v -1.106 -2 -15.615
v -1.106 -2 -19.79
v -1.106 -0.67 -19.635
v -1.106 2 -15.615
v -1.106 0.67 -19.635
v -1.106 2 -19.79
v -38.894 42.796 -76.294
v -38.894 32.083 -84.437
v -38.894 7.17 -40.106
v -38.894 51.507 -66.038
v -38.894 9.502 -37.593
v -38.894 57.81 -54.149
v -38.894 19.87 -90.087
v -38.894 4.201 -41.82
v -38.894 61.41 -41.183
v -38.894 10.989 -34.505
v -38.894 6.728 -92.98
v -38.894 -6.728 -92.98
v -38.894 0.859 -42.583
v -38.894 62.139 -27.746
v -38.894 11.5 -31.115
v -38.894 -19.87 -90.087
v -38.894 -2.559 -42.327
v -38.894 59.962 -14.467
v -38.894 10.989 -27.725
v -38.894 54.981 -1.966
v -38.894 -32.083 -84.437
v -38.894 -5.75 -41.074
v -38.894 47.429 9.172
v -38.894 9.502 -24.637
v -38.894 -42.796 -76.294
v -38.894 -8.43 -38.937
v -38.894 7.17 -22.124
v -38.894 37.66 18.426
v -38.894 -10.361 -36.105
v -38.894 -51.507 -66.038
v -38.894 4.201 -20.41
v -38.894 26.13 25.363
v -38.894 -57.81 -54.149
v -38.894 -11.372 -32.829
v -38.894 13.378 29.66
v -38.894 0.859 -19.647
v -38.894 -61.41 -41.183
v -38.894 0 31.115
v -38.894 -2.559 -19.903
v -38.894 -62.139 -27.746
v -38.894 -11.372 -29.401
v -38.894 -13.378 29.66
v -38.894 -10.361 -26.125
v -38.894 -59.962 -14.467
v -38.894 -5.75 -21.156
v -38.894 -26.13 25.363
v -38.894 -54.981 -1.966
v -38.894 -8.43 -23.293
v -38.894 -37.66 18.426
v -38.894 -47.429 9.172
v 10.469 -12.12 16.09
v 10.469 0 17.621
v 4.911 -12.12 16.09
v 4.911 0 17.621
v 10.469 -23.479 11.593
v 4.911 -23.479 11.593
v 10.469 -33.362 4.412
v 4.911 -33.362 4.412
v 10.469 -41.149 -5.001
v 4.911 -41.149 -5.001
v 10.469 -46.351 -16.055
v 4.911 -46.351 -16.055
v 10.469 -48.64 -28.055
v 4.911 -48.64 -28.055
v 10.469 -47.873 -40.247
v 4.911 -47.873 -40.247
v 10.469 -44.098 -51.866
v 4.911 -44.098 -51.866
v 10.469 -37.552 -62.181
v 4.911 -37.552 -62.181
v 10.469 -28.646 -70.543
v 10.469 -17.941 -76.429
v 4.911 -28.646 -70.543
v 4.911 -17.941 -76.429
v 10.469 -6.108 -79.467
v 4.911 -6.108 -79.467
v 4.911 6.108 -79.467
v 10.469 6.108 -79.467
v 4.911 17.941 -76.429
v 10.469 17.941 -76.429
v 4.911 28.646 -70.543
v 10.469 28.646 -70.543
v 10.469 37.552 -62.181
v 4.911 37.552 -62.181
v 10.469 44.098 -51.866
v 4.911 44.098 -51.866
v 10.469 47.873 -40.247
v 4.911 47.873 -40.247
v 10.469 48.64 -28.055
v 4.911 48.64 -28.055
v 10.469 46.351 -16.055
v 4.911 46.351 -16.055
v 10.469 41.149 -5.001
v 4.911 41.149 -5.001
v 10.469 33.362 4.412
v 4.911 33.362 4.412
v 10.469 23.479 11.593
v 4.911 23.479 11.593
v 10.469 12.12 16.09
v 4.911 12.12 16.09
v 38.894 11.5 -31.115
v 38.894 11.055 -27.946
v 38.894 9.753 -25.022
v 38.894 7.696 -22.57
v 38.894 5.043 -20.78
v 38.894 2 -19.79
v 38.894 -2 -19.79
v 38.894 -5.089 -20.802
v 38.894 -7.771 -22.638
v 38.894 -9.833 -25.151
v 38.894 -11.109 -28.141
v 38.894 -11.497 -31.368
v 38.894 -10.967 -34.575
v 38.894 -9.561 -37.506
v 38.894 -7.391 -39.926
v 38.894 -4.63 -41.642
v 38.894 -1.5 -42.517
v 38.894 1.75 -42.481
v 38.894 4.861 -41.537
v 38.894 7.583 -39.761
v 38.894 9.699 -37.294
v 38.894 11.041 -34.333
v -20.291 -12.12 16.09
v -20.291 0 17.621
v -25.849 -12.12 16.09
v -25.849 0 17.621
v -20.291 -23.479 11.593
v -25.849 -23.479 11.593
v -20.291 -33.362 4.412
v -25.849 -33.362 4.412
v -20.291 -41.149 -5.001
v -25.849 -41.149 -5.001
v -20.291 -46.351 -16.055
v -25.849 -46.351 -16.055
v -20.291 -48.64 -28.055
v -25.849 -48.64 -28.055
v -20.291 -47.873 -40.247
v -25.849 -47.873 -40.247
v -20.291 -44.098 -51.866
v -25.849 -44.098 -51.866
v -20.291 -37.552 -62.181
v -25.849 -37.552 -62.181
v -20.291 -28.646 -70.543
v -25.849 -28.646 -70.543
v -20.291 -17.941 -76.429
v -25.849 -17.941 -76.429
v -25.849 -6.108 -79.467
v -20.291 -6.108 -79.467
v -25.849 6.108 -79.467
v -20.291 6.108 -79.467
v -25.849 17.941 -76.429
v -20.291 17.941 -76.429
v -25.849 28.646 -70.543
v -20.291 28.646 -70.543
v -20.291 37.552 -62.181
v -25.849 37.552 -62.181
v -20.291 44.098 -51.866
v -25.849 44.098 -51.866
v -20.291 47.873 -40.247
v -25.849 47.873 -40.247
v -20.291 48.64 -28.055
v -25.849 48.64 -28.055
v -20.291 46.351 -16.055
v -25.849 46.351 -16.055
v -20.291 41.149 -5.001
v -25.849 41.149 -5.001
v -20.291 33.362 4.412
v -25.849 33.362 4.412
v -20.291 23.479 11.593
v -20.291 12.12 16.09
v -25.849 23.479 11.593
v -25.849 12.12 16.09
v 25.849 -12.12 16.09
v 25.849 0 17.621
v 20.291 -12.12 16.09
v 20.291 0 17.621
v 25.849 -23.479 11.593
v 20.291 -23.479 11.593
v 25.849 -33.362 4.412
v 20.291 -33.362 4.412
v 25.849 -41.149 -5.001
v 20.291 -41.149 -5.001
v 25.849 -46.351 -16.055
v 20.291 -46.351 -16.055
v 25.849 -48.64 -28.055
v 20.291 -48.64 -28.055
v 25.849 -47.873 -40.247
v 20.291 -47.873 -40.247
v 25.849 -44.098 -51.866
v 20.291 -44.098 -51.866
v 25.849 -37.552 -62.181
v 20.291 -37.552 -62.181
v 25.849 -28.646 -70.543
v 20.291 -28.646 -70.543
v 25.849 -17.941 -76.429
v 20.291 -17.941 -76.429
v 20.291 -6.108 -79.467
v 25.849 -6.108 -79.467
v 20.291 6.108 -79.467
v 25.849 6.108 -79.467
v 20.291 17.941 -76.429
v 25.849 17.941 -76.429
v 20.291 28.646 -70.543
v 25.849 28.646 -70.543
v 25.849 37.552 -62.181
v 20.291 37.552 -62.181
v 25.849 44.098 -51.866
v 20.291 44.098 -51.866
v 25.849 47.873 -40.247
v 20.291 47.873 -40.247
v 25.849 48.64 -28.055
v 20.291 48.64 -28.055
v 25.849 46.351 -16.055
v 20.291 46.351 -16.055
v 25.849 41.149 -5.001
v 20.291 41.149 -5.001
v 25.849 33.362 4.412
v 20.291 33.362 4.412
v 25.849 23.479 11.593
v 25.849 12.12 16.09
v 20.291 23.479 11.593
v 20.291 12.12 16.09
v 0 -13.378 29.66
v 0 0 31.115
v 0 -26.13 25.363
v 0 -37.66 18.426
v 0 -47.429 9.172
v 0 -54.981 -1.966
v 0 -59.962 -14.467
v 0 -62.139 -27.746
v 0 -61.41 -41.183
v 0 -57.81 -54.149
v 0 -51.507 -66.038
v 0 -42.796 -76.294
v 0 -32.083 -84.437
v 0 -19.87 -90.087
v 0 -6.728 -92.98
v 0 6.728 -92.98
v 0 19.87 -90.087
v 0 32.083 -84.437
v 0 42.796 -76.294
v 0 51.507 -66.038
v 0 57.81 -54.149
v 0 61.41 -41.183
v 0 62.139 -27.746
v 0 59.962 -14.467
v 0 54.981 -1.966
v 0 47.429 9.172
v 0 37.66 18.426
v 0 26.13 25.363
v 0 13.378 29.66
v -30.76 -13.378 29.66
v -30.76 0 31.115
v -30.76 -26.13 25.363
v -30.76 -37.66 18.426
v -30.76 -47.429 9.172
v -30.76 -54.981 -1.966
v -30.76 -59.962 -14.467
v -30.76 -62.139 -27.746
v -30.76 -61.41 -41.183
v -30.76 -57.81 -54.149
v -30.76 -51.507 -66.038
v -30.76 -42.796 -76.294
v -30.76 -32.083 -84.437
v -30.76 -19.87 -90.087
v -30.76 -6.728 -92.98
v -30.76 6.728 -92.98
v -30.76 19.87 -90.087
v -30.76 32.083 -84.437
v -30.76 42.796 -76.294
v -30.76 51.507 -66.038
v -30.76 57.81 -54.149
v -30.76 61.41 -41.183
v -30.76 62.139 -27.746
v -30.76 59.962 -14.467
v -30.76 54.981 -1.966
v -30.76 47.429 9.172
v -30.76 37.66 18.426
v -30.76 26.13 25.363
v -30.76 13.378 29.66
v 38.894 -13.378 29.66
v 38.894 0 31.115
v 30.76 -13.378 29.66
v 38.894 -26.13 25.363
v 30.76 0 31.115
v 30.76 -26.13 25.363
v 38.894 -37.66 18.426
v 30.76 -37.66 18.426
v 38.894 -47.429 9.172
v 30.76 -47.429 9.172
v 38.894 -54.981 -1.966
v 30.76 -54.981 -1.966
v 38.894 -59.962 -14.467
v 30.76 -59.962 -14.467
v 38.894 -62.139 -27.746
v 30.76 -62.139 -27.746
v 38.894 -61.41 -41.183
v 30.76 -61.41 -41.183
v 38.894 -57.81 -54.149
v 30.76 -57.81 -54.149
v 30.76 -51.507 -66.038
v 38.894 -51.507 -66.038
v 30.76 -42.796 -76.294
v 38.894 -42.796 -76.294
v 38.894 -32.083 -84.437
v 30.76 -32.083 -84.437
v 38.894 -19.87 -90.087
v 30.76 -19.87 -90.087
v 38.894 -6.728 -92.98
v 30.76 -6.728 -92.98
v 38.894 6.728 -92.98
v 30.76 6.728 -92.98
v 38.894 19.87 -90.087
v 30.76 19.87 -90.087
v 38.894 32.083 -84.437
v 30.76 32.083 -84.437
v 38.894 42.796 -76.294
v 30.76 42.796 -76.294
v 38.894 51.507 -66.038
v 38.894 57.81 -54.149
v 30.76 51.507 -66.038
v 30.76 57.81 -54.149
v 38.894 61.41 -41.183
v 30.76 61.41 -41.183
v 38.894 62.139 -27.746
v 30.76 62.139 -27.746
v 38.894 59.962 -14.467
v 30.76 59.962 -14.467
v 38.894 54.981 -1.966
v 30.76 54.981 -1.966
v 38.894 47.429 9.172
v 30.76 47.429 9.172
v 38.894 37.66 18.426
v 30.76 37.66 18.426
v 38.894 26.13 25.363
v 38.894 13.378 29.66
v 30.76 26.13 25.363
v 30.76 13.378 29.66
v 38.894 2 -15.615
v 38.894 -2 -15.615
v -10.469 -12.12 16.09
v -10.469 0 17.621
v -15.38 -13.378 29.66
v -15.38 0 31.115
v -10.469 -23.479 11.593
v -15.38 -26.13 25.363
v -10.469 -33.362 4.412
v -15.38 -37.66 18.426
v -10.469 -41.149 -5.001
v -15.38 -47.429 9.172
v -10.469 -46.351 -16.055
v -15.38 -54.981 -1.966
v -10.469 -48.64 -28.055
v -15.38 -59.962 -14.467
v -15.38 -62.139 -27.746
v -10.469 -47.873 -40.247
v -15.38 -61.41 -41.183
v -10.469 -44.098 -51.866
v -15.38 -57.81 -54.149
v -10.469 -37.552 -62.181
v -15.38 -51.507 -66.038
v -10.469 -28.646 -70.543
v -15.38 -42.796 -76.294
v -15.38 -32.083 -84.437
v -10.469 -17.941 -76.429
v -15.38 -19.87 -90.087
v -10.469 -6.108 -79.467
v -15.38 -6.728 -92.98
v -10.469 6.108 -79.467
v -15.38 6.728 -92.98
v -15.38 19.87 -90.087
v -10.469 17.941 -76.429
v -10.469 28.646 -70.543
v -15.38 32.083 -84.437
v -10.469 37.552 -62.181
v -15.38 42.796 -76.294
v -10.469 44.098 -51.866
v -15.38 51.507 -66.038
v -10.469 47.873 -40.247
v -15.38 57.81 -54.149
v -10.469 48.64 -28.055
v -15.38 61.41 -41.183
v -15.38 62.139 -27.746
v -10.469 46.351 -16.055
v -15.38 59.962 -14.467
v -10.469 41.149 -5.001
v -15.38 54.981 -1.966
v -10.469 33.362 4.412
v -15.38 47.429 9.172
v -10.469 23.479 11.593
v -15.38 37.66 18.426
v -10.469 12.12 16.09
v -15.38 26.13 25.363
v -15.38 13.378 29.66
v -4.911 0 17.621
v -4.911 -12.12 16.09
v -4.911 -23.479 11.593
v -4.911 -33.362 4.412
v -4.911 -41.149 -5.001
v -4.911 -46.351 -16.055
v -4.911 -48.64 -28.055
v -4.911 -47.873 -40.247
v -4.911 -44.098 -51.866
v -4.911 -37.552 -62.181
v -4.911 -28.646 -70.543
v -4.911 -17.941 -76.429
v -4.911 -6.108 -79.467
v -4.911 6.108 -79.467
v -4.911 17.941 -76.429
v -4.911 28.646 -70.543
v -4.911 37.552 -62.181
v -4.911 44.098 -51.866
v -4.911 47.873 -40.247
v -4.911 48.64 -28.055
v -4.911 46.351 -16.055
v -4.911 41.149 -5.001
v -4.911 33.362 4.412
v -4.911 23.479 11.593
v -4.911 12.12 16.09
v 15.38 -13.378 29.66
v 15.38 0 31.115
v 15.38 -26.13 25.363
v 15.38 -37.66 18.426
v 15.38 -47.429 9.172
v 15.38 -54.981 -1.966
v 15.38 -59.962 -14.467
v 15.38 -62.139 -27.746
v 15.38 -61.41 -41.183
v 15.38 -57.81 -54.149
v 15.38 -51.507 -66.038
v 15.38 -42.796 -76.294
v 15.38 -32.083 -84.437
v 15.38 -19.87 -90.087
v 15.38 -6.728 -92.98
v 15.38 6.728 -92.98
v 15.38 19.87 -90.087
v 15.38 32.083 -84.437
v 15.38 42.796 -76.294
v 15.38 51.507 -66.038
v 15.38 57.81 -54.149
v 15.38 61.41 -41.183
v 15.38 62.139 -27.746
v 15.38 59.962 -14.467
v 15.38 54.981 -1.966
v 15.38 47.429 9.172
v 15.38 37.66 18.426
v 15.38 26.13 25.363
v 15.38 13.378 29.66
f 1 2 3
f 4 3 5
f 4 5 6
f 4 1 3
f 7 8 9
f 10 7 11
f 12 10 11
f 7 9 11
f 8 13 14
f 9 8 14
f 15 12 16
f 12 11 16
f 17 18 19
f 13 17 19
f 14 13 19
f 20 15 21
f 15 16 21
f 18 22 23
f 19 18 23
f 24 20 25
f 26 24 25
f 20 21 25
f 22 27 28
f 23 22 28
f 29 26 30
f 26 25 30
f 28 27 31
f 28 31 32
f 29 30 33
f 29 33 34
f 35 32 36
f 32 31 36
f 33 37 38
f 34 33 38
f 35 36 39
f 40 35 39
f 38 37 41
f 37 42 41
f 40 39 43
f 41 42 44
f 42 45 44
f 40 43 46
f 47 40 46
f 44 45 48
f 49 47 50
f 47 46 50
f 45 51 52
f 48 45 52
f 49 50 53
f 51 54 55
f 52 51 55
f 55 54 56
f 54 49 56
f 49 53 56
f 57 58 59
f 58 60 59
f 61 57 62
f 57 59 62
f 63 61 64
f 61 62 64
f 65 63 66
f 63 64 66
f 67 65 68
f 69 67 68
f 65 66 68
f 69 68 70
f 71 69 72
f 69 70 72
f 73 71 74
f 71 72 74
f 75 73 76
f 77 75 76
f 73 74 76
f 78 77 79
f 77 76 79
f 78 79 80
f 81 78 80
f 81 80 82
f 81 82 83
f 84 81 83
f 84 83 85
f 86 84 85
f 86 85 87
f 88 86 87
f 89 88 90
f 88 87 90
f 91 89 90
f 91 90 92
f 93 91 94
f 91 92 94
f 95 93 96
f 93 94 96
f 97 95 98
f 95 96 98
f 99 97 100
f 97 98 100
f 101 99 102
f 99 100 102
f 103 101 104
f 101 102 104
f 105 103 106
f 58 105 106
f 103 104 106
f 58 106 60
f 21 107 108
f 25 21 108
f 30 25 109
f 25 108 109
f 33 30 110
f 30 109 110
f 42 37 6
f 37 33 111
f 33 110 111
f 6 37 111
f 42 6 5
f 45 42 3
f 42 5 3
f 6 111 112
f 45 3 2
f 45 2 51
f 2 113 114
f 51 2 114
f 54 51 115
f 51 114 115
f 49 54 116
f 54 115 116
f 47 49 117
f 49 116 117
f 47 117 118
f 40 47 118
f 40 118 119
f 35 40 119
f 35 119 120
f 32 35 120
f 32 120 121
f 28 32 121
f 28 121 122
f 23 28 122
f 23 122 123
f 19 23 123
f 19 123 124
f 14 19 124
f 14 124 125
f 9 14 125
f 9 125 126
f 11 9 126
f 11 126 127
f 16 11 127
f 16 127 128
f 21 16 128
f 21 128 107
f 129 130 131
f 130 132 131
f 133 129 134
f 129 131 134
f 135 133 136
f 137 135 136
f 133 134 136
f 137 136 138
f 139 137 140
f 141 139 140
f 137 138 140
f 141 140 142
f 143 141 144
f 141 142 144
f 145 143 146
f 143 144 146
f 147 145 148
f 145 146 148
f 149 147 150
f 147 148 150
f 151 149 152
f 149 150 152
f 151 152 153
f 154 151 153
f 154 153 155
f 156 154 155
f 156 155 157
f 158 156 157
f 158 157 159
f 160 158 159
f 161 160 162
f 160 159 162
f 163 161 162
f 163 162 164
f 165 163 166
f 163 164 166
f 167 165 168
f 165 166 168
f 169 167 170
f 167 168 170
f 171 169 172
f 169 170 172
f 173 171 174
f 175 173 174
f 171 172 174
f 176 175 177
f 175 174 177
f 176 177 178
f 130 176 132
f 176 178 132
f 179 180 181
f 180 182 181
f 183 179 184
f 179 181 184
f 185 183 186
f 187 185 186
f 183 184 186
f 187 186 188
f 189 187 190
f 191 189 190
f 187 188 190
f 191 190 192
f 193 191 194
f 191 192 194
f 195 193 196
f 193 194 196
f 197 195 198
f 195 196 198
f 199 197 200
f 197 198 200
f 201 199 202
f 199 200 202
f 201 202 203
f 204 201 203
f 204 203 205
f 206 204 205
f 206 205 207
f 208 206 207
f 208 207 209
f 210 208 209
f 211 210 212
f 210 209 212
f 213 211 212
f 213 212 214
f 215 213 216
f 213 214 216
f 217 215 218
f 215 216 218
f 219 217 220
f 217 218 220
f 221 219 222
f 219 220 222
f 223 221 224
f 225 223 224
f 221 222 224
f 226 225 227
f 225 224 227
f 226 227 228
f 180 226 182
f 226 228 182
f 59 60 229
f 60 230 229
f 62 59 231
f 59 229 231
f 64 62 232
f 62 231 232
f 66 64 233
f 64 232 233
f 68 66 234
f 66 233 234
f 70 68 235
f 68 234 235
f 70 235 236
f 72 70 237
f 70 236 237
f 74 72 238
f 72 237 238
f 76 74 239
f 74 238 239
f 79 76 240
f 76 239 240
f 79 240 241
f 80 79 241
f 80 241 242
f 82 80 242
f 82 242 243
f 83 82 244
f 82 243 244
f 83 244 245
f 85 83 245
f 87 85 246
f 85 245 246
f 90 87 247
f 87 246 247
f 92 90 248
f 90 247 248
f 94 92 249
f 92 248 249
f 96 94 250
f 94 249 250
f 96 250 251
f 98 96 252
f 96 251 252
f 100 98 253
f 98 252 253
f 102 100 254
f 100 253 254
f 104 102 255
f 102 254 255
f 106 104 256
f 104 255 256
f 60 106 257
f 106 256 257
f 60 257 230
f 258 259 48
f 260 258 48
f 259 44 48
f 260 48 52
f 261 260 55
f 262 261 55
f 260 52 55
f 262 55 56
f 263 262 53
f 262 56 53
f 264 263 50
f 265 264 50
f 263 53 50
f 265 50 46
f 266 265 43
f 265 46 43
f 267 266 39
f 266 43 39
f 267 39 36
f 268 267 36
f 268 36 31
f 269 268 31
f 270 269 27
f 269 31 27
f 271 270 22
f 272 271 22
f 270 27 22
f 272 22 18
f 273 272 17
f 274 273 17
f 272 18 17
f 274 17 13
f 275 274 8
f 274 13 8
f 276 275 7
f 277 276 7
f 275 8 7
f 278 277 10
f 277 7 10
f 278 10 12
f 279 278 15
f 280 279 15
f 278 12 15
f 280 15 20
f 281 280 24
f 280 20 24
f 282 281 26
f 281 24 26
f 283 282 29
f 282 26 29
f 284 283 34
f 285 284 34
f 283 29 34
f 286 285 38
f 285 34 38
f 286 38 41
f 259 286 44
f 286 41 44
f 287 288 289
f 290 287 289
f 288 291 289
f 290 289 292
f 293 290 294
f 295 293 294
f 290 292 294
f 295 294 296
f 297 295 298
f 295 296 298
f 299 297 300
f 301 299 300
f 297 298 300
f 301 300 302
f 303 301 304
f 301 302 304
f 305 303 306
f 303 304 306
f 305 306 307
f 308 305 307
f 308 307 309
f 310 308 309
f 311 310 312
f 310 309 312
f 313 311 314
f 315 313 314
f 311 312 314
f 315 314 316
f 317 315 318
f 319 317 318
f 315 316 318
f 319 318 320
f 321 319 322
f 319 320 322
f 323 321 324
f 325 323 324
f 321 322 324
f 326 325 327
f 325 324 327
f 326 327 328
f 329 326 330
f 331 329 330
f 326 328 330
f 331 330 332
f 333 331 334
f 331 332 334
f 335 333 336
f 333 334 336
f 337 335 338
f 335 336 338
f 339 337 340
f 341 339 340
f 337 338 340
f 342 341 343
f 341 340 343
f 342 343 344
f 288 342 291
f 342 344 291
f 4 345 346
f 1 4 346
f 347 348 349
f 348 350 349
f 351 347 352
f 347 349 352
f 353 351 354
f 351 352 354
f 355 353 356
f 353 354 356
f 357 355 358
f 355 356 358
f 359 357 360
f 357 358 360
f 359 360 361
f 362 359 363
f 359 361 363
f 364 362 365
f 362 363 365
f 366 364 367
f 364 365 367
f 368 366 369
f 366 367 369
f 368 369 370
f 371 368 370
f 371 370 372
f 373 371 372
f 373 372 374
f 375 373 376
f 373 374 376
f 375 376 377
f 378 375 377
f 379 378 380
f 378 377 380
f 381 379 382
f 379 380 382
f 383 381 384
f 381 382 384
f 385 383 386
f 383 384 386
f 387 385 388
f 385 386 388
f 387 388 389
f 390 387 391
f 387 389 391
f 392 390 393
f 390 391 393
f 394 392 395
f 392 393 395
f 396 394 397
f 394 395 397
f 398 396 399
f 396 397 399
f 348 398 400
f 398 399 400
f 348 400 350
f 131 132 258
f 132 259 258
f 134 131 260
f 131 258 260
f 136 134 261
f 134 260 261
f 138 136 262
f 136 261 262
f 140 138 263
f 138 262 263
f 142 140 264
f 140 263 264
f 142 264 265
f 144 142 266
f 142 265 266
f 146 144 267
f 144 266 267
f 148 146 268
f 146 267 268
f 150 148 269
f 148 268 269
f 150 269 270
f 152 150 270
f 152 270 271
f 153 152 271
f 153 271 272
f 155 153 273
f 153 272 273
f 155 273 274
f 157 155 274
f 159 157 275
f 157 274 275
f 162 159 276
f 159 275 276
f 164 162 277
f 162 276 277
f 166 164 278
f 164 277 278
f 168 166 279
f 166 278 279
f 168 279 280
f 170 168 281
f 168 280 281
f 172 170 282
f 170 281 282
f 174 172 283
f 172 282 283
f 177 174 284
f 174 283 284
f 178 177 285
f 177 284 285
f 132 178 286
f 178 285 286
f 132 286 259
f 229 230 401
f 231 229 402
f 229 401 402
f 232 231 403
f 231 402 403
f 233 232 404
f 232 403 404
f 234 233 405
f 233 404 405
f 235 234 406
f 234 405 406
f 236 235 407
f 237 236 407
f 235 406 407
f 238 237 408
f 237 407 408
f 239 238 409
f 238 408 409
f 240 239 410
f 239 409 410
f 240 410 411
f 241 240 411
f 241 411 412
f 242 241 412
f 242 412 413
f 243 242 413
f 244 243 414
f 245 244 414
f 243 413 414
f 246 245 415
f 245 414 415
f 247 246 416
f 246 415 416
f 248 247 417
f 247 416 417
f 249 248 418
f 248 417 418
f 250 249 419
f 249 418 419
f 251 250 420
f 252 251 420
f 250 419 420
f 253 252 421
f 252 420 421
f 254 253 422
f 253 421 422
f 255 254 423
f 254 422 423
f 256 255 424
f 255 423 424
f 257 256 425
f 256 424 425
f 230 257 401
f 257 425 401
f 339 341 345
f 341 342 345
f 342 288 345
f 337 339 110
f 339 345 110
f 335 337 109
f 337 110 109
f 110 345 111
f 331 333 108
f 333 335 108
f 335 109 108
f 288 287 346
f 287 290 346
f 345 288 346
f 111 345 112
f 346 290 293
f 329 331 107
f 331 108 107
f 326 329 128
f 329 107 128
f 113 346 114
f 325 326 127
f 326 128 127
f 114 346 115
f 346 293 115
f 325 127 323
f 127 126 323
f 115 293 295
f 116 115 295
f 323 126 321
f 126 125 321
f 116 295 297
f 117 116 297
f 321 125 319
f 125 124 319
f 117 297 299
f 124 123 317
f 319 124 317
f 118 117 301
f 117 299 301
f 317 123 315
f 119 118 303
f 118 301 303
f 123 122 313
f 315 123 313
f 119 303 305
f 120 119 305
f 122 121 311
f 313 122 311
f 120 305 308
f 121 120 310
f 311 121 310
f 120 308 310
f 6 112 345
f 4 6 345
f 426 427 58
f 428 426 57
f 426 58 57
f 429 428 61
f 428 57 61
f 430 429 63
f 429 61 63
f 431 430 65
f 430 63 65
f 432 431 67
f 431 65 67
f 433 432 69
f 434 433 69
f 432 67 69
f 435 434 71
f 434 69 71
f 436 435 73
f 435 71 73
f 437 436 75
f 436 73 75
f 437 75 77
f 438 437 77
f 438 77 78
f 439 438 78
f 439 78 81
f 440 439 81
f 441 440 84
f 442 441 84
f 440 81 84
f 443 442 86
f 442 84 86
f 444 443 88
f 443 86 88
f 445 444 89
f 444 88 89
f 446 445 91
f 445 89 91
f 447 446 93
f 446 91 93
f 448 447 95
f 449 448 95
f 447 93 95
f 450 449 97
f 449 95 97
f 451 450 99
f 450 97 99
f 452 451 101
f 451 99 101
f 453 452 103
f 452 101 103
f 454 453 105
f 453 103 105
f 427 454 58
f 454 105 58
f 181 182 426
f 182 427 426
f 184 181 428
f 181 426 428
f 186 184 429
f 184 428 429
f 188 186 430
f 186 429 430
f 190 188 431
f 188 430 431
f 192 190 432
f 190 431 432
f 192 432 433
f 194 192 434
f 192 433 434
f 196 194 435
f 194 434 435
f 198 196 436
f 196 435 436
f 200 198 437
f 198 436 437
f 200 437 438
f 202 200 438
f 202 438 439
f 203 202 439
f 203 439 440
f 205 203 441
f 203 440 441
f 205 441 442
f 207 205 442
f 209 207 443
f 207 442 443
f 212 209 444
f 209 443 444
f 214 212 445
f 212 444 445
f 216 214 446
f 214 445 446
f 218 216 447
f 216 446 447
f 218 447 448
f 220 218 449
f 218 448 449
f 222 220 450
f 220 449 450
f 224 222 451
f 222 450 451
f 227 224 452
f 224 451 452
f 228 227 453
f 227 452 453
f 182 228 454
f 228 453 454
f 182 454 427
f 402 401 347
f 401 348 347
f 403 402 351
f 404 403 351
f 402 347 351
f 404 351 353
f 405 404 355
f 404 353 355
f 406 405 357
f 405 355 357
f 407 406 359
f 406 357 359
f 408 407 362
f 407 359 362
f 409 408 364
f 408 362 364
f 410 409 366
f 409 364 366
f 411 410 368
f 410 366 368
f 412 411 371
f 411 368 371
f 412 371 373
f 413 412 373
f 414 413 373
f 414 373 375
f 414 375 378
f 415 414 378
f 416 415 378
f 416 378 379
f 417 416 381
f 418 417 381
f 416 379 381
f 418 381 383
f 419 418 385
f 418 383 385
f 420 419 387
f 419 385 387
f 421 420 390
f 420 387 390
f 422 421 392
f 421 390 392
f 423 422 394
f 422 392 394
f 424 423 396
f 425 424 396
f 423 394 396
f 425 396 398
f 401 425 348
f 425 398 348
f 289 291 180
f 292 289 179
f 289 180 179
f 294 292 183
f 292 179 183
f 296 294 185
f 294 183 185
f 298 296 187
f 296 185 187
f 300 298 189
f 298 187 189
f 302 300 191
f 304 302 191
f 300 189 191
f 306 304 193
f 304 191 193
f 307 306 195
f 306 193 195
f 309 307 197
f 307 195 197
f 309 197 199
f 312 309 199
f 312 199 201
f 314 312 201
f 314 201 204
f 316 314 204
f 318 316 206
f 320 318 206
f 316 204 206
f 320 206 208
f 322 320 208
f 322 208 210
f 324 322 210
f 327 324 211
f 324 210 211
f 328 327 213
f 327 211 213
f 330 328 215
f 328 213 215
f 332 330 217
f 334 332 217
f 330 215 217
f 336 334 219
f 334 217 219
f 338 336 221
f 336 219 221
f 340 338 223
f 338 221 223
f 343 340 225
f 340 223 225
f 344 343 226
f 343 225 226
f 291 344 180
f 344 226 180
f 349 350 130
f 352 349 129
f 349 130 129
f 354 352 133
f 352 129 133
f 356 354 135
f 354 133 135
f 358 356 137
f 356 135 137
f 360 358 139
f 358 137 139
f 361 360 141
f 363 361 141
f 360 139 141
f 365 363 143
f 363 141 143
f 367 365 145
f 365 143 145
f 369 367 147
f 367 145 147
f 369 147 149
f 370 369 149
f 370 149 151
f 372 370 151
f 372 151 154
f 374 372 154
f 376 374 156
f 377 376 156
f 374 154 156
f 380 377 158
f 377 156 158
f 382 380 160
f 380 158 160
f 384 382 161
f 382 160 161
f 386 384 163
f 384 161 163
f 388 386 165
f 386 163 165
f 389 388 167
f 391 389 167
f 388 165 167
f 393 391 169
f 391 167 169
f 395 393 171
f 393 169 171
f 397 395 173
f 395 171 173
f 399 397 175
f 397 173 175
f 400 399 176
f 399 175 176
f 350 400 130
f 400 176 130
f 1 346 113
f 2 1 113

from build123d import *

# Parameters (mm, degrees)
F2_R     = 11.5
F3_DEPTH = 80.518
F5_DEPTH = 40


# Not quite as in the source:
# - ends of sketch curves that miss each other by under 0.0002 mm in the source are joined


with BuildPart() as f1:
    # F0 (on Front) → F1 (revolve)
    with BuildSketch(Plane.XZ):
        Polygon((-30.76, 31.115), (-38.89375, 31.115), (-38.89375, -31.115), (-30.76, -31.115), (30.76, -31.115), (38.89375, -31.115), (38.89375, 31.115), (30.76, 31.115), (25.8486765474, 17.62125), (20.2913232706, 17.62125), (15.379999922, 31.115), (10.4686765734, 17.62125), (4.9113232966, 17.62125), (-5.2e-08, 31.115), (-4.9113234006, 17.62125), (-10.4686766774, 17.62125), (-15.380000026, 31.115), (-20.2913233746, 17.62125), (-25.8486766514, 17.62125), align=None)
    revolve(axis=Axis((0, 0, -31.115), (1, 0, 0)))

    # F2 (on face) → F3 (cut)
    with BuildSketch(Plane.YZ.offset(38.89375)):
        with Locations((0, -31.115)):
            Circle(F2_R)
    extrude(amount=-F3_DEPTH, mode=Mode.SUBTRACT)

    # F4 (on face) → F5 (cut)
    with BuildSketch(Plane.YZ.offset(38.89375)):
        with BuildLine():
            Line((2, -15.615), (0, -15.615))
            Line((0, -15.615), (-2, -15.615))
            Line((-2, -15.615), (-2, -19.7902483471))
            ThreePointArc((-2, -19.7902483471), (0, -19.615), (2, -19.7902483471))
            Line((2, -19.7902483471), (2, -15.615))
        make_face()
    extrude(amount=-F5_DEPTH, mode=Mode.SUBTRACT)


solid = f1.part
